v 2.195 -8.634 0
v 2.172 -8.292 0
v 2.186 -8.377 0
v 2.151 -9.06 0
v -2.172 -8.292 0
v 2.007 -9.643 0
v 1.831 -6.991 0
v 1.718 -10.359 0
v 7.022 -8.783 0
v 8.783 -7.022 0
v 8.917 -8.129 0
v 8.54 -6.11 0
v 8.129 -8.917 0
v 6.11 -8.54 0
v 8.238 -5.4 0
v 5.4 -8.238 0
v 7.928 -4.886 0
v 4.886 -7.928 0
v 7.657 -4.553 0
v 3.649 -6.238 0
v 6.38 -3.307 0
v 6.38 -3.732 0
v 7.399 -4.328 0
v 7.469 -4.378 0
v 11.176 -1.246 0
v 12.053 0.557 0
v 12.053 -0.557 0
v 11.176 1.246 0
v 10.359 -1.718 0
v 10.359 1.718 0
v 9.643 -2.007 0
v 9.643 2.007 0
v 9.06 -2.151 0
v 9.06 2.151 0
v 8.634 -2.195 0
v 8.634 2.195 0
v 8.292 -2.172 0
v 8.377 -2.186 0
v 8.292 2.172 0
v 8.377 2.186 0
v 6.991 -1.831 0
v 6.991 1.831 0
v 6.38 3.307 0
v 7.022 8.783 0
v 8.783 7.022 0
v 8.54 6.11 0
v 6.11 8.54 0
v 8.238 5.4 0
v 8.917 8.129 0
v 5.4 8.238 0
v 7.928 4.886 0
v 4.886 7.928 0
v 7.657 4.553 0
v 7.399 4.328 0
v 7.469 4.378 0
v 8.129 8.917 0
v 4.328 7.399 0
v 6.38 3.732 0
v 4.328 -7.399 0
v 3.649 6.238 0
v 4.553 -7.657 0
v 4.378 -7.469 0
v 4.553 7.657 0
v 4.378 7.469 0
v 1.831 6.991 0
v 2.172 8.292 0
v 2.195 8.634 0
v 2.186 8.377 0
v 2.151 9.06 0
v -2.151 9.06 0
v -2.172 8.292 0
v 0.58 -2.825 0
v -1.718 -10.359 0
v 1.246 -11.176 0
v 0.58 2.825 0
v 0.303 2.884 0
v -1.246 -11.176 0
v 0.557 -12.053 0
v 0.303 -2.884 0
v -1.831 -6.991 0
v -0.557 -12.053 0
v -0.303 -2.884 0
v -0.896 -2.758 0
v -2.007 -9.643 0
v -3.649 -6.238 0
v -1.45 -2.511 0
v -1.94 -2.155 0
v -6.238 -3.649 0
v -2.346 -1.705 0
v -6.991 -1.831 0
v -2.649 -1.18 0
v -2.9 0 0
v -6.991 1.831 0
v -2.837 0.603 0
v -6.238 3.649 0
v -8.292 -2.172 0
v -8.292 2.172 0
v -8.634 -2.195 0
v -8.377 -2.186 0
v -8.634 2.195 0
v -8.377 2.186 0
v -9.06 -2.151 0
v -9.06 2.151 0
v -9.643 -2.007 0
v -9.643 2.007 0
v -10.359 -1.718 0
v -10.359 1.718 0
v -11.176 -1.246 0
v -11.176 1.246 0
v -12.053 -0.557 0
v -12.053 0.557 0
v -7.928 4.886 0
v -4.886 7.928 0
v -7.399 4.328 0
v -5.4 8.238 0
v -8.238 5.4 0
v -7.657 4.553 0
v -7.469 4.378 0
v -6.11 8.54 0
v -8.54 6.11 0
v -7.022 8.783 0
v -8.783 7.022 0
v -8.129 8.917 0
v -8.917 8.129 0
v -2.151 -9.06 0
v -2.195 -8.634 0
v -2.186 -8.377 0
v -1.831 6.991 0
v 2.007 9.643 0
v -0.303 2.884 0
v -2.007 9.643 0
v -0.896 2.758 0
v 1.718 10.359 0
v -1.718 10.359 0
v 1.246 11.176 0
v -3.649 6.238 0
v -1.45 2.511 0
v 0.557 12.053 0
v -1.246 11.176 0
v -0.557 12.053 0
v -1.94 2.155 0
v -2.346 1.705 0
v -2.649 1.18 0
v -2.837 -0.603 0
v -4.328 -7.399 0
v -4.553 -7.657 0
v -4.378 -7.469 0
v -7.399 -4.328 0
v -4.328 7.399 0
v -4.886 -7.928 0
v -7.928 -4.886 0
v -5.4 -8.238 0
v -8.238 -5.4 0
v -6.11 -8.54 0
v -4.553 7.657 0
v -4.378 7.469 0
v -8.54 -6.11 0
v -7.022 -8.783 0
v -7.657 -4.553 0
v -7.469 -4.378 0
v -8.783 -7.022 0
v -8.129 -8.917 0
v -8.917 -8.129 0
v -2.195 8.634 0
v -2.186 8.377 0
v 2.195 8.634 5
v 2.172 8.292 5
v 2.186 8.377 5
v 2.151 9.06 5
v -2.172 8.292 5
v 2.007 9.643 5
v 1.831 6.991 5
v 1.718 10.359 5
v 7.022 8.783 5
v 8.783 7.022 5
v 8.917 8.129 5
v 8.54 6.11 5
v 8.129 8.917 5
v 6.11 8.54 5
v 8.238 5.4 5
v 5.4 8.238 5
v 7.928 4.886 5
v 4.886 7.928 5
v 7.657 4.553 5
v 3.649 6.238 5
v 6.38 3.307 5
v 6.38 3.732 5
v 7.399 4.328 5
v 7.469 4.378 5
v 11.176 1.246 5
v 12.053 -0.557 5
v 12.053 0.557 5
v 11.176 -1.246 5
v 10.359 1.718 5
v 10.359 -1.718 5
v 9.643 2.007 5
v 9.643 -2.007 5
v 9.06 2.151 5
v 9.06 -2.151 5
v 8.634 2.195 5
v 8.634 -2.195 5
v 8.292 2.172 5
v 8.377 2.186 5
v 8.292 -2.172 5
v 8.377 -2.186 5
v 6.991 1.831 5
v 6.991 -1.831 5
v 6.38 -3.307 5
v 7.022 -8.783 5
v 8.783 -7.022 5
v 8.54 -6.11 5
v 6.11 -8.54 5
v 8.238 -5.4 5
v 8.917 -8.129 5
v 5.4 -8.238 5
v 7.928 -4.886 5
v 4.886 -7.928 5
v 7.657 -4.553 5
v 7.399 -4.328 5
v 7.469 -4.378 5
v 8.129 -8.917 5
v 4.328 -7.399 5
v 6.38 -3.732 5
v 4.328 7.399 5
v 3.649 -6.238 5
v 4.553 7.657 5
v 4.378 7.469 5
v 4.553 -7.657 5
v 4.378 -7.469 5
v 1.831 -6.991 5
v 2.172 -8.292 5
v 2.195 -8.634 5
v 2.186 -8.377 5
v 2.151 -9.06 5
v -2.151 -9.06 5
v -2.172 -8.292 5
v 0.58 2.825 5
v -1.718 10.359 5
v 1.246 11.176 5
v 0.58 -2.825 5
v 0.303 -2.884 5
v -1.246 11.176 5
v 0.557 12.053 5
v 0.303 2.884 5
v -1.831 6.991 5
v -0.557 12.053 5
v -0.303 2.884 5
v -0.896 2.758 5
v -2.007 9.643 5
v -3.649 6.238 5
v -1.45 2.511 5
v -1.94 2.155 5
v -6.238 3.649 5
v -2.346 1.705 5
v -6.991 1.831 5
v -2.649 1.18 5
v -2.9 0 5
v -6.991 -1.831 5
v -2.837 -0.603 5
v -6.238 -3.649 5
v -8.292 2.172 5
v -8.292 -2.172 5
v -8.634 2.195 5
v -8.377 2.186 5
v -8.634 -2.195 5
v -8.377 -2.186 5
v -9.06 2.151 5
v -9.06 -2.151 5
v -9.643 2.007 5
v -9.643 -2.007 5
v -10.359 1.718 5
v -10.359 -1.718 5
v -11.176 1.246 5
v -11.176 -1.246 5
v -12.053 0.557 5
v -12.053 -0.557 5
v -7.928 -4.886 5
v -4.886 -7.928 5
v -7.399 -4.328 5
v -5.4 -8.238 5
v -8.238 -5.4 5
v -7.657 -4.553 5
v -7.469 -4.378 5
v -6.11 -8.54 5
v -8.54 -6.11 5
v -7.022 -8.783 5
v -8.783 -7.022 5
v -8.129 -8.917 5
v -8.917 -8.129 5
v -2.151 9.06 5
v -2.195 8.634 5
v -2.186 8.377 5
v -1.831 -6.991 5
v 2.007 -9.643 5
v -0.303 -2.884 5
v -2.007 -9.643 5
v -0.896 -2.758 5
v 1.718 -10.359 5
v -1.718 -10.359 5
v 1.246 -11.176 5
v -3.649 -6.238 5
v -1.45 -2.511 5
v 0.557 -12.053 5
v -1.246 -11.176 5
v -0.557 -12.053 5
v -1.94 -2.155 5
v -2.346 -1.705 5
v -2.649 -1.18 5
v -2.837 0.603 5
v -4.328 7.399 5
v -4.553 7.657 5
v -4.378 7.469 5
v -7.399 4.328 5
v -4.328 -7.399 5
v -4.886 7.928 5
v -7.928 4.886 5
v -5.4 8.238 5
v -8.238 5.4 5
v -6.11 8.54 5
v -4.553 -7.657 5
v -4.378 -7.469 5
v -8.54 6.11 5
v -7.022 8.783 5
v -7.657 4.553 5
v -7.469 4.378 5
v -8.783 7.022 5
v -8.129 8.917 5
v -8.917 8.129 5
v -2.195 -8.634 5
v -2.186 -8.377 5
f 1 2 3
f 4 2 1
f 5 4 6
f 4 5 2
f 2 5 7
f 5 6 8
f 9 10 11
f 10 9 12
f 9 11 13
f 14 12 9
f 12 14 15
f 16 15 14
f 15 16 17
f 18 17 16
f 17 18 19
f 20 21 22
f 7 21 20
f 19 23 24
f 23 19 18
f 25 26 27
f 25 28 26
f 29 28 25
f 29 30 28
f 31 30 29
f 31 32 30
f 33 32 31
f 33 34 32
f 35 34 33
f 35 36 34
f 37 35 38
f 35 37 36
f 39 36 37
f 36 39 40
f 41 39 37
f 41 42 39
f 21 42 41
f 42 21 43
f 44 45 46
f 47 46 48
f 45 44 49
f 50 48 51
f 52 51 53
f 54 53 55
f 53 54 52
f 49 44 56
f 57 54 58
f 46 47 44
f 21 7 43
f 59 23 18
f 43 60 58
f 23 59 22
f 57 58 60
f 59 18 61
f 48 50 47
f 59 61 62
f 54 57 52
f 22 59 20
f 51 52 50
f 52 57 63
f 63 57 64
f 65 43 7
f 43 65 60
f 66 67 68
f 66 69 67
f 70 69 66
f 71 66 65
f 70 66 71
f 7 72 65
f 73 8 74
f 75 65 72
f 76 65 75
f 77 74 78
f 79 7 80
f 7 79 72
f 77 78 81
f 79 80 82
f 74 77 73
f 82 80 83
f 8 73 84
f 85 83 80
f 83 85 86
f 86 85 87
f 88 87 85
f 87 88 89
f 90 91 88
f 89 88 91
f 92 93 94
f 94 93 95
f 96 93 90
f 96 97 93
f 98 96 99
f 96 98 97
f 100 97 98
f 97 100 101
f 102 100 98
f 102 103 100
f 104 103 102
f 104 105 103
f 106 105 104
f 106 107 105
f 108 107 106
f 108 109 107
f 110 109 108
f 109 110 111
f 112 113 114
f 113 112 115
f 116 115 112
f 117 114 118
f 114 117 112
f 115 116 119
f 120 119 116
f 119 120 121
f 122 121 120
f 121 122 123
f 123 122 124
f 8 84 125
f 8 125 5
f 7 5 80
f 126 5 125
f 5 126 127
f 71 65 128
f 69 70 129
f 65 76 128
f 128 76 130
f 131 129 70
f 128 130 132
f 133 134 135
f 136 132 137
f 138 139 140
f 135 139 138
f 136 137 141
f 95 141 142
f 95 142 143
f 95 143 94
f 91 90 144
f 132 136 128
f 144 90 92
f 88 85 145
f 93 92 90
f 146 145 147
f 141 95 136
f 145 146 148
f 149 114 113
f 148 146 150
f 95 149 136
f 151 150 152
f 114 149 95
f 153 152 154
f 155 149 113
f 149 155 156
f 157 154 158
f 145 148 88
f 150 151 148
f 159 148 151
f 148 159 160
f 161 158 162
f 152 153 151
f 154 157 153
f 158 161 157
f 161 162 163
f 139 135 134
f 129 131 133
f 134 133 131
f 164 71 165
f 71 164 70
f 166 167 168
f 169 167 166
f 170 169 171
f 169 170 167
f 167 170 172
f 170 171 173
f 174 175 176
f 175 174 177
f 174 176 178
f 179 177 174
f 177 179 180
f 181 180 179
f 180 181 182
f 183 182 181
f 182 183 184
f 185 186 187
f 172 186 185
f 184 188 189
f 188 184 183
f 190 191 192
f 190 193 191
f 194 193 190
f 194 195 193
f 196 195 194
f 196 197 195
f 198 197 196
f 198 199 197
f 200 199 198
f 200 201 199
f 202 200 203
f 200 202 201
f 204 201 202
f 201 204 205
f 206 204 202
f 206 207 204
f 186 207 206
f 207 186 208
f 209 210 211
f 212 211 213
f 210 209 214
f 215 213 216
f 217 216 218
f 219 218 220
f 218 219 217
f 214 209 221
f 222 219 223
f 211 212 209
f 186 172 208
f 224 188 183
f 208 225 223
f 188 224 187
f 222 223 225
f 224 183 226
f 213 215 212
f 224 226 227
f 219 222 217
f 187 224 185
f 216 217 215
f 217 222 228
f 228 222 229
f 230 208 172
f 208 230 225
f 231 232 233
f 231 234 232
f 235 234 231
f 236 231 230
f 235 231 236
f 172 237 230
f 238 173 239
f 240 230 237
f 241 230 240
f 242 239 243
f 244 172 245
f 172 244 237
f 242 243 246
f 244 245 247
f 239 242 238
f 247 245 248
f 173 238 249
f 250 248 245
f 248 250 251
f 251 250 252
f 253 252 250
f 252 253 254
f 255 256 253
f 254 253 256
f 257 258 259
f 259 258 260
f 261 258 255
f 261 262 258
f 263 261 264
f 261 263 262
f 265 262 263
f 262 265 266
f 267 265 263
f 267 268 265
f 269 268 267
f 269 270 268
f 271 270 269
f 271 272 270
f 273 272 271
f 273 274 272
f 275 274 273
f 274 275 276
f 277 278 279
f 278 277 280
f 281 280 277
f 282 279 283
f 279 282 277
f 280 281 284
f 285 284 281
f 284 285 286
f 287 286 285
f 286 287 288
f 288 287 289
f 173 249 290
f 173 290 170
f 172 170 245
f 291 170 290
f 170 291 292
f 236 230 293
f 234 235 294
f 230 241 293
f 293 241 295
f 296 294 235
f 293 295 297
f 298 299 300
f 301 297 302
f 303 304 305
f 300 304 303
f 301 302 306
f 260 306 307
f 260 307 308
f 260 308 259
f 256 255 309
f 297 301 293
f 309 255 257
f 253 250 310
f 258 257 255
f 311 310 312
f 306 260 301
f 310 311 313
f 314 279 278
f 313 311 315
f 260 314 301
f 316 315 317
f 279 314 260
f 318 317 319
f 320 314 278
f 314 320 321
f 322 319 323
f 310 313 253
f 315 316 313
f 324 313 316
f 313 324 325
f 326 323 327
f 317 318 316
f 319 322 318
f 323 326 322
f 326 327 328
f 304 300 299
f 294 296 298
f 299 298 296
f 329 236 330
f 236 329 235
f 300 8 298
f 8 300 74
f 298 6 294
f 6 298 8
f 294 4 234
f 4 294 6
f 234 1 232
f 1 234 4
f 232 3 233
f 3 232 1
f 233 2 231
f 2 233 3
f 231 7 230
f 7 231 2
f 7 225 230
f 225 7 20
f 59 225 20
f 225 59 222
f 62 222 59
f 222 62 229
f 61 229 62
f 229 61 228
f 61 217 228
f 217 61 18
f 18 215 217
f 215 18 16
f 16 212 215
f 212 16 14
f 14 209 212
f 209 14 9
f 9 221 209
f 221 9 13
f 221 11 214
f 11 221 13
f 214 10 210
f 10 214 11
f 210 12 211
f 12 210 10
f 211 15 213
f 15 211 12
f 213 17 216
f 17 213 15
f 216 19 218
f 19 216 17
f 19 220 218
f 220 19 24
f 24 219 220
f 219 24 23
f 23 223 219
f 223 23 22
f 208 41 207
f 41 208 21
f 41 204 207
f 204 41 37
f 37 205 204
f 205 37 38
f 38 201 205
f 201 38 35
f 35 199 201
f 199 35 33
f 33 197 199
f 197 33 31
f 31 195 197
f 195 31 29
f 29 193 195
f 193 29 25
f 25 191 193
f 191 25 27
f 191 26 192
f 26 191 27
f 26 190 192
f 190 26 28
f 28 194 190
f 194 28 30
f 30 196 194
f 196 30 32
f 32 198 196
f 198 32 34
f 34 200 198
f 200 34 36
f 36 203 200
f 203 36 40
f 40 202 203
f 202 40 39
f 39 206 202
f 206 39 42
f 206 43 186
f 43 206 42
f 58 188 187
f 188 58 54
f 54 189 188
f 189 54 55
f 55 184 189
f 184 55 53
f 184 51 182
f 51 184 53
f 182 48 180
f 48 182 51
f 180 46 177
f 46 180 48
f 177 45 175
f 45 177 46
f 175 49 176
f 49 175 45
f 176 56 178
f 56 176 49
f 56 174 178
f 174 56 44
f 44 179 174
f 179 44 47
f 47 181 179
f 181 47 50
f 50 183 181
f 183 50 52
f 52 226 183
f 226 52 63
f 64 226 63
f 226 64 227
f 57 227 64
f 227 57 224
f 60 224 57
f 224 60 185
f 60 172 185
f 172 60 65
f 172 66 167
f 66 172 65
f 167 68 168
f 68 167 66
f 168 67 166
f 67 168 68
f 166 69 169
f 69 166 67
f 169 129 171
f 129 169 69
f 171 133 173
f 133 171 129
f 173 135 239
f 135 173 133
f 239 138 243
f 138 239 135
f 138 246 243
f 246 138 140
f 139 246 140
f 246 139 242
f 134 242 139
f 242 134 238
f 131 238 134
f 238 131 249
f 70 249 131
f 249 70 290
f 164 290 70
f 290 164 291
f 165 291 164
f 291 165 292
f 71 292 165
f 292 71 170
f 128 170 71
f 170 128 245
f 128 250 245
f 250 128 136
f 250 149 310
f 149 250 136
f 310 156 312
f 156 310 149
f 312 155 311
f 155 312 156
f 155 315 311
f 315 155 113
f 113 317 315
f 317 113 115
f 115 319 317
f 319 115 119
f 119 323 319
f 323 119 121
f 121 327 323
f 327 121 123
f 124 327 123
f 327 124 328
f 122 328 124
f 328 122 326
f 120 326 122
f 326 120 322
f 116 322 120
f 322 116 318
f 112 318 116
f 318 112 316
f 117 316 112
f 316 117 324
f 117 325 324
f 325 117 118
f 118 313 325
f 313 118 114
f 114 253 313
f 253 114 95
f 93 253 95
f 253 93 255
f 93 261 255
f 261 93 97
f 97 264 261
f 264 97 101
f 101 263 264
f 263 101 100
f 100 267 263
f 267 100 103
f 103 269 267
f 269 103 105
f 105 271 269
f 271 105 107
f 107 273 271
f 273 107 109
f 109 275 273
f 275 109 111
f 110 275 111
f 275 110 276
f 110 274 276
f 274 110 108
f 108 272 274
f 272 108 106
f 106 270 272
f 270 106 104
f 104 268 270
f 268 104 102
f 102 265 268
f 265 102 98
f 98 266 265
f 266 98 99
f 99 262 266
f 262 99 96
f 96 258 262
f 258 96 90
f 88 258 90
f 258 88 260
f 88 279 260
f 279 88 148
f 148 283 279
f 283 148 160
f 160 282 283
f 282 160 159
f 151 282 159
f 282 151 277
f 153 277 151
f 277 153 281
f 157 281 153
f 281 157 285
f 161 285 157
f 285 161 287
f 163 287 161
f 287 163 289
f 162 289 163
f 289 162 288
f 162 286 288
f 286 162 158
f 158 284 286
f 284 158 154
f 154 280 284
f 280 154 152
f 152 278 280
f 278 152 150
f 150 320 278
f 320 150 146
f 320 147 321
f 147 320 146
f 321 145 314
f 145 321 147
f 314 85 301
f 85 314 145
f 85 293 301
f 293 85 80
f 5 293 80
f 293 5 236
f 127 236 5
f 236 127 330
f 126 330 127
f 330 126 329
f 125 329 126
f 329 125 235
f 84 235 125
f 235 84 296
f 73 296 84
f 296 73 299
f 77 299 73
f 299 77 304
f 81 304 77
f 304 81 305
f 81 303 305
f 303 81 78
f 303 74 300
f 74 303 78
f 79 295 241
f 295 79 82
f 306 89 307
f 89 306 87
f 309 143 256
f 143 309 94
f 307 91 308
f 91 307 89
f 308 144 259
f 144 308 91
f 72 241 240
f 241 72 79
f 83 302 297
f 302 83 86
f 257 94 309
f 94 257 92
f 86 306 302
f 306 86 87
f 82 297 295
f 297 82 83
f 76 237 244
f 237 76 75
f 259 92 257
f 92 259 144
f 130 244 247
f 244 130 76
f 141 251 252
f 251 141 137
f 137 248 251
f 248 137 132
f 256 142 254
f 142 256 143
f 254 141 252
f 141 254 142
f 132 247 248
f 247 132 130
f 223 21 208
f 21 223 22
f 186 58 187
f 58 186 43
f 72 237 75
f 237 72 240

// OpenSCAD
include <MCAD/involute_gears.scad>
$fn = 30;

prong_dia = 5.8; //form fit hot!!!!
prong_depth = 3;
rim_thickness = 5;
hole_wall_thickness = 1.5;
washer_thickness = 3;

gear (number_of_teeth=8,
					circular_pitch=450,
					hub_diameter=0,
					rim_width=6,
					rim_thickness=rim_thickness,
                    bore_diameter=prong_dia,
pressure_angle=31);

translate([.6*prong_dia,0,rim_thickness/2]){
cube([prong_dia,10,rim_thickness],center=true);
}

/*
//Washer
translate([0,0,rim_thickness])
cylinder(d=7, washer_thickness);
*/

/*
difference(){
translate([0,0, rim_thickness])
cylinder(d=prong_dia, 6 + washer_thickness);

translate([.5*prong_dia,0,rim_thickness+2+4/2+.01 + washer_thickness]){
cube([4,5,4],center=true);
}
}
*/
